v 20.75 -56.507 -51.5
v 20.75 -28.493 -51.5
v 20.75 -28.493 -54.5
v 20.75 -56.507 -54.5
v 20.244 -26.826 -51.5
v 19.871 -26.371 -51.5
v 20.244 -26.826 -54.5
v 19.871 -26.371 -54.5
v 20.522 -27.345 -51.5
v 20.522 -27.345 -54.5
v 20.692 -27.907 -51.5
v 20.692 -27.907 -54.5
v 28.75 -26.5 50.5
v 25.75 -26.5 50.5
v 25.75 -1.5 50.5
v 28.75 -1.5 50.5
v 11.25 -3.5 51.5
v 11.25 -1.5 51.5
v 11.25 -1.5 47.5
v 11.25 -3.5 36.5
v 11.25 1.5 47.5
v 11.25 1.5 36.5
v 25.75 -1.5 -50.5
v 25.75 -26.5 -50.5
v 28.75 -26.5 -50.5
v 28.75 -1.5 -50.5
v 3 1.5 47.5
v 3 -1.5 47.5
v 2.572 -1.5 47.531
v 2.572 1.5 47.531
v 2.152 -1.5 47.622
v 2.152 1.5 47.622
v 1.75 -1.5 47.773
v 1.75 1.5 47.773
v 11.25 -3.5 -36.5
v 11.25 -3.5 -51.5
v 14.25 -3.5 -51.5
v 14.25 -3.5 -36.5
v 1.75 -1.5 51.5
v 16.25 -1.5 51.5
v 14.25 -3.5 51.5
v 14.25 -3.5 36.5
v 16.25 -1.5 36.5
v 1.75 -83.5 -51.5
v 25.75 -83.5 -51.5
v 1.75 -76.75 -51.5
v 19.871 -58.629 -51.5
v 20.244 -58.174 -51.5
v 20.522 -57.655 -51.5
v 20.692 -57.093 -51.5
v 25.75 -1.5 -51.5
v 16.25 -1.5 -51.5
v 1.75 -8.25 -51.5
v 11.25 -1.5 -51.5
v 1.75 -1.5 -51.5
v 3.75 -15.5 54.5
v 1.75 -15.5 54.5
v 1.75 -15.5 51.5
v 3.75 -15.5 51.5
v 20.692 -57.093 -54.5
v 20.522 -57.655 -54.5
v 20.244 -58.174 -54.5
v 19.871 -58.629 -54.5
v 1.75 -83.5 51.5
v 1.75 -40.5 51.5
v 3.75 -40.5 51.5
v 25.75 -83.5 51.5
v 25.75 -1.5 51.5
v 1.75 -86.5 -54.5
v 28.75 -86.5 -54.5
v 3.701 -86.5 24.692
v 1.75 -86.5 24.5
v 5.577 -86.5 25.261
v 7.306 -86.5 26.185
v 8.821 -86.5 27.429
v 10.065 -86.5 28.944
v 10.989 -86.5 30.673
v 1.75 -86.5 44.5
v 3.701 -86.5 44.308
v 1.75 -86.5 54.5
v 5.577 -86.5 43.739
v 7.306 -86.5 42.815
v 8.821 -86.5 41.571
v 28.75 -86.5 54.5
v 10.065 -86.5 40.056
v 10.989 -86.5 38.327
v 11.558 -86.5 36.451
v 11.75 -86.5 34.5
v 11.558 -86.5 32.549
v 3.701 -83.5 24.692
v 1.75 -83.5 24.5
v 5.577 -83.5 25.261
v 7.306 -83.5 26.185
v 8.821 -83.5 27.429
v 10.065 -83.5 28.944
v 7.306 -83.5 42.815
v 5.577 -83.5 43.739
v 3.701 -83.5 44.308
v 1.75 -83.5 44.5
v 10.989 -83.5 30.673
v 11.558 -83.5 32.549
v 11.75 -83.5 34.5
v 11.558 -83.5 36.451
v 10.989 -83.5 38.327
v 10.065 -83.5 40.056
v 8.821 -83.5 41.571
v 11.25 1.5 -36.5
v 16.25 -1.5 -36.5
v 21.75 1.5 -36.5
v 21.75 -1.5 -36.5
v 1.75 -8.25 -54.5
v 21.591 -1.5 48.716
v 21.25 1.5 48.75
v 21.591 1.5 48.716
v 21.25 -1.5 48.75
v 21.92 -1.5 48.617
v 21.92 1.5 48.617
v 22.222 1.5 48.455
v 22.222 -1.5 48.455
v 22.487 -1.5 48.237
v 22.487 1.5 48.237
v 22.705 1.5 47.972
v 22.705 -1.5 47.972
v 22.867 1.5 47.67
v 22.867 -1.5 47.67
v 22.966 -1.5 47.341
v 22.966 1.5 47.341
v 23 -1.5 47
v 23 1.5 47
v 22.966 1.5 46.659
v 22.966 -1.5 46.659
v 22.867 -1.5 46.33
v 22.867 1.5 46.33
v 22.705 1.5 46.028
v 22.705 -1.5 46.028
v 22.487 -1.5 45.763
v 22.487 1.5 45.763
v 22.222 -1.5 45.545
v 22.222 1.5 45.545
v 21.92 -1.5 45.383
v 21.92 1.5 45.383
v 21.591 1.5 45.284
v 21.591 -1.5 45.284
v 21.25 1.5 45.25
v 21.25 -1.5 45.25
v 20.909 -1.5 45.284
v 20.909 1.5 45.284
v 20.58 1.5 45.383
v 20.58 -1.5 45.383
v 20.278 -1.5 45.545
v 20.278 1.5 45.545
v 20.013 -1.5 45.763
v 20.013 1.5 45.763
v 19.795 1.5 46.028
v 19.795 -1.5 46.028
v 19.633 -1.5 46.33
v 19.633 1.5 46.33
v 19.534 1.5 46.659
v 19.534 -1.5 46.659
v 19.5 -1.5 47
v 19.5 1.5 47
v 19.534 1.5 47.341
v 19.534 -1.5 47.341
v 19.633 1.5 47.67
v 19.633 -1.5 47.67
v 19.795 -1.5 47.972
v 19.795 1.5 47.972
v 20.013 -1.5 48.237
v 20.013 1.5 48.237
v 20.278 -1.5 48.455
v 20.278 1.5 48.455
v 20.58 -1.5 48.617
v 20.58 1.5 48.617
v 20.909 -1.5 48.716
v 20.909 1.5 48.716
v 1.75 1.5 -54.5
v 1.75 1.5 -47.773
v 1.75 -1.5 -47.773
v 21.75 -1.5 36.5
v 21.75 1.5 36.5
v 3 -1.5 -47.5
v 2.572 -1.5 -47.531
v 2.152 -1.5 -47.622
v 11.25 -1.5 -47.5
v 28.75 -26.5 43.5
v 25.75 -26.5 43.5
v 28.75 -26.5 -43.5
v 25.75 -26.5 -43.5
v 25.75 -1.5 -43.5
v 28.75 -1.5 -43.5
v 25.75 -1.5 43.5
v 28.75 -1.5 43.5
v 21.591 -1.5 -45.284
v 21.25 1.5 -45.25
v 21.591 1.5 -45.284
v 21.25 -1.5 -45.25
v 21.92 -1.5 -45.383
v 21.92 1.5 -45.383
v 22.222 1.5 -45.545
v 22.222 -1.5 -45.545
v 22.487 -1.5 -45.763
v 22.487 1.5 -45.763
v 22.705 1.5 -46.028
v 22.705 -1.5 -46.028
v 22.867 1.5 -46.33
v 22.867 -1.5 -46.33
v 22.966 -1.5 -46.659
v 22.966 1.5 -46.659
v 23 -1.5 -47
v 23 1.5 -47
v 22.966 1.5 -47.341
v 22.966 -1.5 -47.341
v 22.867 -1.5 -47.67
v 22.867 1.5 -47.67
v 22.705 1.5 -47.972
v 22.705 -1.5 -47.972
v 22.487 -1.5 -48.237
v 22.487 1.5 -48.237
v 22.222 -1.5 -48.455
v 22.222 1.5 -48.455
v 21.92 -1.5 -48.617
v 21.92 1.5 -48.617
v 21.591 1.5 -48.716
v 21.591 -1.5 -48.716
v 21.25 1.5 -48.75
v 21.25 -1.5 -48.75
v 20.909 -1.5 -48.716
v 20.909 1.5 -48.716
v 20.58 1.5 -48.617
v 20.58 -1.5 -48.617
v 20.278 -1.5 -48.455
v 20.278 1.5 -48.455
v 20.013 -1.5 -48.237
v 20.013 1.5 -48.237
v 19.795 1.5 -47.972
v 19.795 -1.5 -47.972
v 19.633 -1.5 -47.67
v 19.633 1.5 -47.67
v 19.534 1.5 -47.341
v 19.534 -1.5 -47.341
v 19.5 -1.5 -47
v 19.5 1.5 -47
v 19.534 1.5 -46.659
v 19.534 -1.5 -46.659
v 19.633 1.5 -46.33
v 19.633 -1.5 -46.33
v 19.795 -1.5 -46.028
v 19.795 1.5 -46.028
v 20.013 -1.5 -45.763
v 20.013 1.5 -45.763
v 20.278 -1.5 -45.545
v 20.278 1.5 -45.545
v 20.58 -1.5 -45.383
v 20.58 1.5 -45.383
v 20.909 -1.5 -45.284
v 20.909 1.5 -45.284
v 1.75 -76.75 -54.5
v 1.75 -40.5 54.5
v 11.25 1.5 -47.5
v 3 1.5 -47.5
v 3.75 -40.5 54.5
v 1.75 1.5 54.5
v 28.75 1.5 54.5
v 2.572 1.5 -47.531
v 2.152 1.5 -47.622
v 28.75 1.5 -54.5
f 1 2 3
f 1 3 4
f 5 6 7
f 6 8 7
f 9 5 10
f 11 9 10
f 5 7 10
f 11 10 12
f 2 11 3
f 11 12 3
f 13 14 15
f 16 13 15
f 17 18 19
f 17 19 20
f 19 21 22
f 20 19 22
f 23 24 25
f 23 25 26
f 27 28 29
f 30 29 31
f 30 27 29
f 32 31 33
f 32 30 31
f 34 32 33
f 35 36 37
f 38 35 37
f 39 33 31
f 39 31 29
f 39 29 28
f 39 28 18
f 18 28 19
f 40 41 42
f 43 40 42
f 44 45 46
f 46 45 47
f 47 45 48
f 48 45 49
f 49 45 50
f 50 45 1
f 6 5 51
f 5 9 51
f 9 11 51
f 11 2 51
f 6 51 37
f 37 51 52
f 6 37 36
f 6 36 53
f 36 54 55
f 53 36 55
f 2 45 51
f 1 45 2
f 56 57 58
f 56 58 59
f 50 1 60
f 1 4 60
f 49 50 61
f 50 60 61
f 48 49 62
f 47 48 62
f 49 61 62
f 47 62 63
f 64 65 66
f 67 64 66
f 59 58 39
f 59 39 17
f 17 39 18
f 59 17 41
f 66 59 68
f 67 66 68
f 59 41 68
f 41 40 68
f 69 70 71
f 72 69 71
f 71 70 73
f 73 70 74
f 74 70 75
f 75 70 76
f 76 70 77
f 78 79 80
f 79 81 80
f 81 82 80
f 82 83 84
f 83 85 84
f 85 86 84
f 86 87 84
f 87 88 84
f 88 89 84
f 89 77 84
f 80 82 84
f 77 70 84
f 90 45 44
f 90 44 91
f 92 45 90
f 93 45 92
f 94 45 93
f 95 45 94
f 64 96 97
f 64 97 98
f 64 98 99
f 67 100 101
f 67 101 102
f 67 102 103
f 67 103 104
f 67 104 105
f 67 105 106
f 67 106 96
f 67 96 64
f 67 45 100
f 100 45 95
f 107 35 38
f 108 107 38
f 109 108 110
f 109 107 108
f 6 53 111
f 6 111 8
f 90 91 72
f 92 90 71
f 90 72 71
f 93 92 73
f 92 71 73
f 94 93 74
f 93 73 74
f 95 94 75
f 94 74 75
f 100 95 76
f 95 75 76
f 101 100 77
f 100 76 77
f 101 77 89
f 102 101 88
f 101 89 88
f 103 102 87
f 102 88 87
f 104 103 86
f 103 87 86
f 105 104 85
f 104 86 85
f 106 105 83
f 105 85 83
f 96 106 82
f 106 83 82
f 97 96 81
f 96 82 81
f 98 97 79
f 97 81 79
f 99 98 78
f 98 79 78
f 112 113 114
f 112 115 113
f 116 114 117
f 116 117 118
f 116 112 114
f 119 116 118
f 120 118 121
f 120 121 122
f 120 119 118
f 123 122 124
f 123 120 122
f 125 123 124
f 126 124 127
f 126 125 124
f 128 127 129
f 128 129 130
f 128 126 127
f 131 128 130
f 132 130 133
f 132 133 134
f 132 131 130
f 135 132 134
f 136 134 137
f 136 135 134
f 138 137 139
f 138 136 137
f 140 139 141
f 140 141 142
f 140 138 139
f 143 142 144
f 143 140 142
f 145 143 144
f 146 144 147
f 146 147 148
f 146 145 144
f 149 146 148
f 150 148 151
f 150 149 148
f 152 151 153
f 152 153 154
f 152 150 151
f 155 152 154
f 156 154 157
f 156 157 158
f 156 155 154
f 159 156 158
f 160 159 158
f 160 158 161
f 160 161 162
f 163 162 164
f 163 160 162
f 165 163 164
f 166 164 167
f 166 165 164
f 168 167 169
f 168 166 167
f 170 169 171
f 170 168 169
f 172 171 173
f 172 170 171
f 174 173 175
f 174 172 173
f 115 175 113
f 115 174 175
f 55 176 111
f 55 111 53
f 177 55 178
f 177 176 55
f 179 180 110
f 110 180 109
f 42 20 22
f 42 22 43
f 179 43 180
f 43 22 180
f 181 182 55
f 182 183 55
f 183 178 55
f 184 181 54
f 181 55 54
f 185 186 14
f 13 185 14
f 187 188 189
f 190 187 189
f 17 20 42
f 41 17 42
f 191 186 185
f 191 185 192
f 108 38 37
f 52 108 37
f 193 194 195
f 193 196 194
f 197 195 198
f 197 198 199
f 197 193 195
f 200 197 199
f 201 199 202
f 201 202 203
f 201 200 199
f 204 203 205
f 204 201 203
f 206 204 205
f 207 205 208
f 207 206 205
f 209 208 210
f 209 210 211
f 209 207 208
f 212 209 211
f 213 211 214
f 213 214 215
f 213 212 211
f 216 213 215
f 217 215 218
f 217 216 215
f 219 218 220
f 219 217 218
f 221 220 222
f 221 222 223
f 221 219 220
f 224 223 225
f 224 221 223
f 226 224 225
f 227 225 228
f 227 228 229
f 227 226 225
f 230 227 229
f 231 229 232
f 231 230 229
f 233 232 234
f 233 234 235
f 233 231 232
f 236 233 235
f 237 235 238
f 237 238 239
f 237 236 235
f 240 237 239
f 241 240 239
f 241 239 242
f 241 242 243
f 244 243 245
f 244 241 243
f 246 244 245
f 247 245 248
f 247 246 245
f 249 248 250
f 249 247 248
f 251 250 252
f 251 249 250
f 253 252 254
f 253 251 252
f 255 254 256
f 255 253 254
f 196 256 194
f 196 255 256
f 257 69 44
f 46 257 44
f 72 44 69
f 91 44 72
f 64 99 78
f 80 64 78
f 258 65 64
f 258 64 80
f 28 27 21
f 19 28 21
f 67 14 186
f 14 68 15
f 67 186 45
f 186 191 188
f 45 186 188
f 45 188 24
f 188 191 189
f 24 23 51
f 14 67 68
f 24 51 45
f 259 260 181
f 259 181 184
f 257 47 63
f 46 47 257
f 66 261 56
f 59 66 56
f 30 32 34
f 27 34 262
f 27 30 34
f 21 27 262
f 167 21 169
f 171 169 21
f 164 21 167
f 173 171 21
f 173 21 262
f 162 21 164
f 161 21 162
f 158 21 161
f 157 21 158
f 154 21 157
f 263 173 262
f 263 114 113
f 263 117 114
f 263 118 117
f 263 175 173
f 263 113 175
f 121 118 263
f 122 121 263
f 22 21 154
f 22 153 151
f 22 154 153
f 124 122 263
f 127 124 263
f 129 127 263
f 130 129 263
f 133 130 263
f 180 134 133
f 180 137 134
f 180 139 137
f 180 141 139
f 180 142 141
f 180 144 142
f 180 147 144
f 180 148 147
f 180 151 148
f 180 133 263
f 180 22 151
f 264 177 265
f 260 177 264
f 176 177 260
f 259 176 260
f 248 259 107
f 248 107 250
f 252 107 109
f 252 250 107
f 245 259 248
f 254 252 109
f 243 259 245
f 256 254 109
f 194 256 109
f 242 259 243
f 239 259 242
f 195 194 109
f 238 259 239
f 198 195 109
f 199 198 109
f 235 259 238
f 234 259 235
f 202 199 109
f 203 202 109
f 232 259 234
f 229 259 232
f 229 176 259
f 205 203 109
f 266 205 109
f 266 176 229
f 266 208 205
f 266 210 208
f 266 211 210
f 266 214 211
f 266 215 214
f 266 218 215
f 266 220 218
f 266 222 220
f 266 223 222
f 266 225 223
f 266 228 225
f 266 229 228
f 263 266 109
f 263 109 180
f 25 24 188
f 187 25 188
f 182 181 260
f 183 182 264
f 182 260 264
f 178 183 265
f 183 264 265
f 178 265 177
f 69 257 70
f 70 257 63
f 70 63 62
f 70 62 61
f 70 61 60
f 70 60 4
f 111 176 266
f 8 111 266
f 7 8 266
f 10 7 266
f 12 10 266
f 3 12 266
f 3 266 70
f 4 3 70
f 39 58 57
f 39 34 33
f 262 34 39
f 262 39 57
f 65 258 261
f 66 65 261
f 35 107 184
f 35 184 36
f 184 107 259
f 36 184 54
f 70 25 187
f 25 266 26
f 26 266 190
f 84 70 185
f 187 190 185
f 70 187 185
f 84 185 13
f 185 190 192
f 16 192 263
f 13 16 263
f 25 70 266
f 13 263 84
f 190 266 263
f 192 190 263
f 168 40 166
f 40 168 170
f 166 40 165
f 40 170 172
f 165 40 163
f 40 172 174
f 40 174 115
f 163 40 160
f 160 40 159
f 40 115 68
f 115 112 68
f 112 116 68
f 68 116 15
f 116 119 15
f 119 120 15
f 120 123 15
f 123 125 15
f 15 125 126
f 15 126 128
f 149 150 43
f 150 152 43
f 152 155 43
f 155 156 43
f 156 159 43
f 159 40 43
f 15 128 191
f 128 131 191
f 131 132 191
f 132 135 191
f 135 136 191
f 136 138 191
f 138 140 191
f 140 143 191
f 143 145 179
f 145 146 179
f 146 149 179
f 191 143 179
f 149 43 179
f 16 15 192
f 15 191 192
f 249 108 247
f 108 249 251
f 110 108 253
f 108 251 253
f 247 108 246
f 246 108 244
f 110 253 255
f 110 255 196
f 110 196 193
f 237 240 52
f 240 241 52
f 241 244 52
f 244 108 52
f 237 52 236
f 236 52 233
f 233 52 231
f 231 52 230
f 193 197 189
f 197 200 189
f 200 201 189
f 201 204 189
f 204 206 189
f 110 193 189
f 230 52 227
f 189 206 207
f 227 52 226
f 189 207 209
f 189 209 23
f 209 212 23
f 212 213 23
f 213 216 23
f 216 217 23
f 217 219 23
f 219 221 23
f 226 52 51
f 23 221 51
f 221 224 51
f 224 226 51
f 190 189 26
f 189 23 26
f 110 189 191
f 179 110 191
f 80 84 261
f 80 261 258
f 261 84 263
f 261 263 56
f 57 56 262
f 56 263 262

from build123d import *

# Parameters (mm, degrees)
SKETCH1_W           = 57.5
SKETCH1_H           = 109
SKETCH1_R           = 1.75
SKETCH1_W_2         = 28.5
SKETCH1_H_2         = 95
BOSS_EXTRUDE1_DEPTH = 1.5
SKETCH3_W           = 43.5
SKETCH3_H           = 81
CUT_EXTRUDE1_DEPTH  = 3
BOSS_EXTRUDE2_DEPTH = 85
SKETCH5_W           = 145.39083122
SKETCH5_H           = 125.853938275
CUT_EXTRUDE2_DEPTH  = 85
CUT_EXTRUDE3_DEPTH  = 140.802762848
SKETCH8_W           = 103
SKETCH8_H           = 3
BOSS_EXTRUDE3_DEPTH = 25.75
FILLET3_R           = 3
SKETCH13_W          = 109
SKETCH13_H          = 88
CUT_EXTRUDE8_DEPTH  = 1.75
SKETCH14_W          = 2
SKETCH14_H          = 25
CUT_EXTRUDE9_DEPTH  = 5
SKETCH15_W          = 7
SKETCH15_H          = 25
CUT_EXTRUDE10_DEPTH = 106.016665344
SKETCH16_W          = 3
SKETCH16_H          = 15
BOSS_EXTRUDE4_DEPTH = 5
SKETCH17_W          = 7.5
SKETCH17_H          = 4
BOSS_EXTRUDE5_DEPTH = 3
CHAMFER1_SIZE       = 2
SKETCH18_R          = 10
CUT_EXTRUDE11_DEPTH = 10


with BuildPart() as part:
    # Sketch1 → Boss-Extrude1 (new, symmetric)
    with BuildSketch(Plane(origin=(0, 0, 0), x_dir=(1, 0, 0), z_dir=(0, 1, 0))):
        Rectangle(SKETCH1_W, SKETCH1_H)
        with Locations(Location((-21.25, 47, 0), (0, 0, 270))):
            Circle(SKETCH1_R, mode=Mode.SUBTRACT)
        with Locations(Location((21.25, 47, 0), (0, 0, 270))):
            Circle(SKETCH1_R, mode=Mode.SUBTRACT)
        with Locations(Location((21.25, -47, 0), (0, 0, 270))):
            Circle(SKETCH1_R, mode=Mode.SUBTRACT)
        with Locations(Location((-21.25, -47, 0), (0, 0, 270))):
            Circle(SKETCH1_R, mode=Mode.SUBTRACT)
        Rectangle(SKETCH1_W_2, SKETCH1_H_2, mode=Mode.SUBTRACT)
    extrude(amount=BOSS_EXTRUDE1_DEPTH, both=True)

    # Sketch3 → Cut-Extrude1 (cut)
    with BuildSketch(Plane(origin=(0, 1.5, 0), x_dir=(1, 0, 0), z_dir=(0, 1, 0))):
        Rectangle(SKETCH3_W, SKETCH3_H)
    extrude(amount=-CUT_EXTRUDE1_DEPTH, mode=Mode.SUBTRACT)

    # Sketch4 → Boss-Extrude2 (add)
    with BuildSketch(Plane.XZ.offset(1.5)):
        Polygon((28.75, 54.5), (27.30464021, 54.5), (-28.75, 54.5), (-28.75, 51.5), (25.75, 51.5), (25.75, -51.5), (-28.75, -51.5), (-28.75, -54.5), (27.30464021, -54.5), (28.75, -54.5), align=None)
    extrude(amount=BOSS_EXTRUDE2_DEPTH)

    # Sketch5 → Cut-Extrude2 (cut)
    with BuildSketch(Plane(origin=(0, 0, 0), x_dir=(0, 0, -1), z_dir=(1, 0, 0))):
        with Locations((7.269541561, -54.313017537)):
            Rectangle(SKETCH5_W, SKETCH5_H)
    extrude(amount=-CUT_EXTRUDE2_DEPTH, mode=Mode.SUBTRACT)

    # Sketch6 → Cut-Extrude3 (cut, through all)
    with BuildSketch(Plane(origin=(0, 0, 51.5), x_dir=(-1, 0, 0), z_dir=(0, 0, -1))):
        Polygon((0, -6.5), (-20.75, -27.25), (-20.75, -57.75), (0, -78.5), align=None)
    extrude(amount=CUT_EXTRUDE3_DEPTH, mode=Mode.SUBTRACT)

    # Sketch8 → Boss-Extrude3 (add)
    with BuildSketch(Plane.ZY.offset(-25.75)):
        with Locations((0, -85)):
            Rectangle(SKETCH8_W, SKETCH8_H)
    extrude(amount=BOSS_EXTRUDE3_DEPTH)

    # Fillet3
    fillet3_edges = [part.edges().sort_by_distance(p)[0] for p in [
        (0, 0, -47.5),
        (0, 0, 47.5),
        (0, -78.5, -53),
        (20.75, -27.25, -53),
        (0, -6.5, -53),
        (20.75, -57.75, -53),
        (14.25, 0, 47.5),
        (14.25, 0, -47.5),
        (21.75, 0, 40.5),
        (21.75, 0, -40.5),
    ]]
    fillet(fillet3_edges, radius=FILLET3_R)

    # Sketch13 → Cut-Extrude8 (cut)
    with BuildSketch(Plane.ZY):
        with Locations((0, -42.5)):
            Rectangle(SKETCH13_W, SKETCH13_H)
    extrude(amount=-CUT_EXTRUDE8_DEPTH, mode=Mode.SUBTRACT)

    # Sketch14 → Cut-Extrude9 (cut)
    with BuildSketch(Plane.XY.offset(54.5)):
        with Locations((2.75, -28)):
            Rectangle(SKETCH14_W, SKETCH14_H)
    extrude(amount=-CUT_EXTRUDE9_DEPTH, mode=Mode.SUBTRACT)

    # Sketch15 → Cut-Extrude10 (cut, through all)
    with BuildSketch(Plane.ZY.offset(-25.75)):
        with Locations((47, -14)):
            Rectangle(SKETCH15_W, SKETCH15_H)
        with Locations((-47, -14)):
            Rectangle(SKETCH15_W, SKETCH15_H)
    extrude(amount=-CUT_EXTRUDE10_DEPTH, mode=Mode.SUBTRACT)

    # Sketch16 → Boss-Extrude4 (add)
    with BuildSketch(Plane(origin=(0, 1.5, 0), x_dir=(1, 0, 0), z_dir=(0, 1, 0))):
        with Locations((12.75, 44)):
            Rectangle(SKETCH16_W, SKETCH16_H)
        with Locations((12.75, -44)):
            Rectangle(SKETCH16_W, SKETCH16_H)
    extrude(amount=-BOSS_EXTRUDE4_DEPTH)

    # Sketch17 → Boss-Extrude5 (add)
    with BuildSketch(Plane(origin=(0, 1.5, 0), x_dir=(1, 0, 0), z_dir=(0, 1, 0))):
        with Locations((18, 38.5)):
            Rectangle(SKETCH17_W, SKETCH17_H)
        with Locations((18, -38.5)):
            Rectangle(SKETCH17_W, SKETCH17_H)
    extrude(amount=-BOSS_EXTRUDE5_DEPTH)

    # Chamfer1
    chamfer1_edges = [part.edges().sort_by_distance(p)[0] for p in [
        (14.25, -1.5, 44),
        (14.25, -1.5, -44),
    ]]
    chamfer(chamfer1_edges, length=CHAMFER1_SIZE - 0.0001)  # a hair under: the kernel refuses the full size

    # Sketch18 → Cut-Extrude11 (cut)
    with BuildSketch(Plane.XZ.offset(86.5)):
        with Locations((1.75, 34.5)):
            Circle(SKETCH18_R)
    extrude(amount=-CUT_EXTRUDE11_DEPTH, mode=Mode.SUBTRACT)


solid = part.part
